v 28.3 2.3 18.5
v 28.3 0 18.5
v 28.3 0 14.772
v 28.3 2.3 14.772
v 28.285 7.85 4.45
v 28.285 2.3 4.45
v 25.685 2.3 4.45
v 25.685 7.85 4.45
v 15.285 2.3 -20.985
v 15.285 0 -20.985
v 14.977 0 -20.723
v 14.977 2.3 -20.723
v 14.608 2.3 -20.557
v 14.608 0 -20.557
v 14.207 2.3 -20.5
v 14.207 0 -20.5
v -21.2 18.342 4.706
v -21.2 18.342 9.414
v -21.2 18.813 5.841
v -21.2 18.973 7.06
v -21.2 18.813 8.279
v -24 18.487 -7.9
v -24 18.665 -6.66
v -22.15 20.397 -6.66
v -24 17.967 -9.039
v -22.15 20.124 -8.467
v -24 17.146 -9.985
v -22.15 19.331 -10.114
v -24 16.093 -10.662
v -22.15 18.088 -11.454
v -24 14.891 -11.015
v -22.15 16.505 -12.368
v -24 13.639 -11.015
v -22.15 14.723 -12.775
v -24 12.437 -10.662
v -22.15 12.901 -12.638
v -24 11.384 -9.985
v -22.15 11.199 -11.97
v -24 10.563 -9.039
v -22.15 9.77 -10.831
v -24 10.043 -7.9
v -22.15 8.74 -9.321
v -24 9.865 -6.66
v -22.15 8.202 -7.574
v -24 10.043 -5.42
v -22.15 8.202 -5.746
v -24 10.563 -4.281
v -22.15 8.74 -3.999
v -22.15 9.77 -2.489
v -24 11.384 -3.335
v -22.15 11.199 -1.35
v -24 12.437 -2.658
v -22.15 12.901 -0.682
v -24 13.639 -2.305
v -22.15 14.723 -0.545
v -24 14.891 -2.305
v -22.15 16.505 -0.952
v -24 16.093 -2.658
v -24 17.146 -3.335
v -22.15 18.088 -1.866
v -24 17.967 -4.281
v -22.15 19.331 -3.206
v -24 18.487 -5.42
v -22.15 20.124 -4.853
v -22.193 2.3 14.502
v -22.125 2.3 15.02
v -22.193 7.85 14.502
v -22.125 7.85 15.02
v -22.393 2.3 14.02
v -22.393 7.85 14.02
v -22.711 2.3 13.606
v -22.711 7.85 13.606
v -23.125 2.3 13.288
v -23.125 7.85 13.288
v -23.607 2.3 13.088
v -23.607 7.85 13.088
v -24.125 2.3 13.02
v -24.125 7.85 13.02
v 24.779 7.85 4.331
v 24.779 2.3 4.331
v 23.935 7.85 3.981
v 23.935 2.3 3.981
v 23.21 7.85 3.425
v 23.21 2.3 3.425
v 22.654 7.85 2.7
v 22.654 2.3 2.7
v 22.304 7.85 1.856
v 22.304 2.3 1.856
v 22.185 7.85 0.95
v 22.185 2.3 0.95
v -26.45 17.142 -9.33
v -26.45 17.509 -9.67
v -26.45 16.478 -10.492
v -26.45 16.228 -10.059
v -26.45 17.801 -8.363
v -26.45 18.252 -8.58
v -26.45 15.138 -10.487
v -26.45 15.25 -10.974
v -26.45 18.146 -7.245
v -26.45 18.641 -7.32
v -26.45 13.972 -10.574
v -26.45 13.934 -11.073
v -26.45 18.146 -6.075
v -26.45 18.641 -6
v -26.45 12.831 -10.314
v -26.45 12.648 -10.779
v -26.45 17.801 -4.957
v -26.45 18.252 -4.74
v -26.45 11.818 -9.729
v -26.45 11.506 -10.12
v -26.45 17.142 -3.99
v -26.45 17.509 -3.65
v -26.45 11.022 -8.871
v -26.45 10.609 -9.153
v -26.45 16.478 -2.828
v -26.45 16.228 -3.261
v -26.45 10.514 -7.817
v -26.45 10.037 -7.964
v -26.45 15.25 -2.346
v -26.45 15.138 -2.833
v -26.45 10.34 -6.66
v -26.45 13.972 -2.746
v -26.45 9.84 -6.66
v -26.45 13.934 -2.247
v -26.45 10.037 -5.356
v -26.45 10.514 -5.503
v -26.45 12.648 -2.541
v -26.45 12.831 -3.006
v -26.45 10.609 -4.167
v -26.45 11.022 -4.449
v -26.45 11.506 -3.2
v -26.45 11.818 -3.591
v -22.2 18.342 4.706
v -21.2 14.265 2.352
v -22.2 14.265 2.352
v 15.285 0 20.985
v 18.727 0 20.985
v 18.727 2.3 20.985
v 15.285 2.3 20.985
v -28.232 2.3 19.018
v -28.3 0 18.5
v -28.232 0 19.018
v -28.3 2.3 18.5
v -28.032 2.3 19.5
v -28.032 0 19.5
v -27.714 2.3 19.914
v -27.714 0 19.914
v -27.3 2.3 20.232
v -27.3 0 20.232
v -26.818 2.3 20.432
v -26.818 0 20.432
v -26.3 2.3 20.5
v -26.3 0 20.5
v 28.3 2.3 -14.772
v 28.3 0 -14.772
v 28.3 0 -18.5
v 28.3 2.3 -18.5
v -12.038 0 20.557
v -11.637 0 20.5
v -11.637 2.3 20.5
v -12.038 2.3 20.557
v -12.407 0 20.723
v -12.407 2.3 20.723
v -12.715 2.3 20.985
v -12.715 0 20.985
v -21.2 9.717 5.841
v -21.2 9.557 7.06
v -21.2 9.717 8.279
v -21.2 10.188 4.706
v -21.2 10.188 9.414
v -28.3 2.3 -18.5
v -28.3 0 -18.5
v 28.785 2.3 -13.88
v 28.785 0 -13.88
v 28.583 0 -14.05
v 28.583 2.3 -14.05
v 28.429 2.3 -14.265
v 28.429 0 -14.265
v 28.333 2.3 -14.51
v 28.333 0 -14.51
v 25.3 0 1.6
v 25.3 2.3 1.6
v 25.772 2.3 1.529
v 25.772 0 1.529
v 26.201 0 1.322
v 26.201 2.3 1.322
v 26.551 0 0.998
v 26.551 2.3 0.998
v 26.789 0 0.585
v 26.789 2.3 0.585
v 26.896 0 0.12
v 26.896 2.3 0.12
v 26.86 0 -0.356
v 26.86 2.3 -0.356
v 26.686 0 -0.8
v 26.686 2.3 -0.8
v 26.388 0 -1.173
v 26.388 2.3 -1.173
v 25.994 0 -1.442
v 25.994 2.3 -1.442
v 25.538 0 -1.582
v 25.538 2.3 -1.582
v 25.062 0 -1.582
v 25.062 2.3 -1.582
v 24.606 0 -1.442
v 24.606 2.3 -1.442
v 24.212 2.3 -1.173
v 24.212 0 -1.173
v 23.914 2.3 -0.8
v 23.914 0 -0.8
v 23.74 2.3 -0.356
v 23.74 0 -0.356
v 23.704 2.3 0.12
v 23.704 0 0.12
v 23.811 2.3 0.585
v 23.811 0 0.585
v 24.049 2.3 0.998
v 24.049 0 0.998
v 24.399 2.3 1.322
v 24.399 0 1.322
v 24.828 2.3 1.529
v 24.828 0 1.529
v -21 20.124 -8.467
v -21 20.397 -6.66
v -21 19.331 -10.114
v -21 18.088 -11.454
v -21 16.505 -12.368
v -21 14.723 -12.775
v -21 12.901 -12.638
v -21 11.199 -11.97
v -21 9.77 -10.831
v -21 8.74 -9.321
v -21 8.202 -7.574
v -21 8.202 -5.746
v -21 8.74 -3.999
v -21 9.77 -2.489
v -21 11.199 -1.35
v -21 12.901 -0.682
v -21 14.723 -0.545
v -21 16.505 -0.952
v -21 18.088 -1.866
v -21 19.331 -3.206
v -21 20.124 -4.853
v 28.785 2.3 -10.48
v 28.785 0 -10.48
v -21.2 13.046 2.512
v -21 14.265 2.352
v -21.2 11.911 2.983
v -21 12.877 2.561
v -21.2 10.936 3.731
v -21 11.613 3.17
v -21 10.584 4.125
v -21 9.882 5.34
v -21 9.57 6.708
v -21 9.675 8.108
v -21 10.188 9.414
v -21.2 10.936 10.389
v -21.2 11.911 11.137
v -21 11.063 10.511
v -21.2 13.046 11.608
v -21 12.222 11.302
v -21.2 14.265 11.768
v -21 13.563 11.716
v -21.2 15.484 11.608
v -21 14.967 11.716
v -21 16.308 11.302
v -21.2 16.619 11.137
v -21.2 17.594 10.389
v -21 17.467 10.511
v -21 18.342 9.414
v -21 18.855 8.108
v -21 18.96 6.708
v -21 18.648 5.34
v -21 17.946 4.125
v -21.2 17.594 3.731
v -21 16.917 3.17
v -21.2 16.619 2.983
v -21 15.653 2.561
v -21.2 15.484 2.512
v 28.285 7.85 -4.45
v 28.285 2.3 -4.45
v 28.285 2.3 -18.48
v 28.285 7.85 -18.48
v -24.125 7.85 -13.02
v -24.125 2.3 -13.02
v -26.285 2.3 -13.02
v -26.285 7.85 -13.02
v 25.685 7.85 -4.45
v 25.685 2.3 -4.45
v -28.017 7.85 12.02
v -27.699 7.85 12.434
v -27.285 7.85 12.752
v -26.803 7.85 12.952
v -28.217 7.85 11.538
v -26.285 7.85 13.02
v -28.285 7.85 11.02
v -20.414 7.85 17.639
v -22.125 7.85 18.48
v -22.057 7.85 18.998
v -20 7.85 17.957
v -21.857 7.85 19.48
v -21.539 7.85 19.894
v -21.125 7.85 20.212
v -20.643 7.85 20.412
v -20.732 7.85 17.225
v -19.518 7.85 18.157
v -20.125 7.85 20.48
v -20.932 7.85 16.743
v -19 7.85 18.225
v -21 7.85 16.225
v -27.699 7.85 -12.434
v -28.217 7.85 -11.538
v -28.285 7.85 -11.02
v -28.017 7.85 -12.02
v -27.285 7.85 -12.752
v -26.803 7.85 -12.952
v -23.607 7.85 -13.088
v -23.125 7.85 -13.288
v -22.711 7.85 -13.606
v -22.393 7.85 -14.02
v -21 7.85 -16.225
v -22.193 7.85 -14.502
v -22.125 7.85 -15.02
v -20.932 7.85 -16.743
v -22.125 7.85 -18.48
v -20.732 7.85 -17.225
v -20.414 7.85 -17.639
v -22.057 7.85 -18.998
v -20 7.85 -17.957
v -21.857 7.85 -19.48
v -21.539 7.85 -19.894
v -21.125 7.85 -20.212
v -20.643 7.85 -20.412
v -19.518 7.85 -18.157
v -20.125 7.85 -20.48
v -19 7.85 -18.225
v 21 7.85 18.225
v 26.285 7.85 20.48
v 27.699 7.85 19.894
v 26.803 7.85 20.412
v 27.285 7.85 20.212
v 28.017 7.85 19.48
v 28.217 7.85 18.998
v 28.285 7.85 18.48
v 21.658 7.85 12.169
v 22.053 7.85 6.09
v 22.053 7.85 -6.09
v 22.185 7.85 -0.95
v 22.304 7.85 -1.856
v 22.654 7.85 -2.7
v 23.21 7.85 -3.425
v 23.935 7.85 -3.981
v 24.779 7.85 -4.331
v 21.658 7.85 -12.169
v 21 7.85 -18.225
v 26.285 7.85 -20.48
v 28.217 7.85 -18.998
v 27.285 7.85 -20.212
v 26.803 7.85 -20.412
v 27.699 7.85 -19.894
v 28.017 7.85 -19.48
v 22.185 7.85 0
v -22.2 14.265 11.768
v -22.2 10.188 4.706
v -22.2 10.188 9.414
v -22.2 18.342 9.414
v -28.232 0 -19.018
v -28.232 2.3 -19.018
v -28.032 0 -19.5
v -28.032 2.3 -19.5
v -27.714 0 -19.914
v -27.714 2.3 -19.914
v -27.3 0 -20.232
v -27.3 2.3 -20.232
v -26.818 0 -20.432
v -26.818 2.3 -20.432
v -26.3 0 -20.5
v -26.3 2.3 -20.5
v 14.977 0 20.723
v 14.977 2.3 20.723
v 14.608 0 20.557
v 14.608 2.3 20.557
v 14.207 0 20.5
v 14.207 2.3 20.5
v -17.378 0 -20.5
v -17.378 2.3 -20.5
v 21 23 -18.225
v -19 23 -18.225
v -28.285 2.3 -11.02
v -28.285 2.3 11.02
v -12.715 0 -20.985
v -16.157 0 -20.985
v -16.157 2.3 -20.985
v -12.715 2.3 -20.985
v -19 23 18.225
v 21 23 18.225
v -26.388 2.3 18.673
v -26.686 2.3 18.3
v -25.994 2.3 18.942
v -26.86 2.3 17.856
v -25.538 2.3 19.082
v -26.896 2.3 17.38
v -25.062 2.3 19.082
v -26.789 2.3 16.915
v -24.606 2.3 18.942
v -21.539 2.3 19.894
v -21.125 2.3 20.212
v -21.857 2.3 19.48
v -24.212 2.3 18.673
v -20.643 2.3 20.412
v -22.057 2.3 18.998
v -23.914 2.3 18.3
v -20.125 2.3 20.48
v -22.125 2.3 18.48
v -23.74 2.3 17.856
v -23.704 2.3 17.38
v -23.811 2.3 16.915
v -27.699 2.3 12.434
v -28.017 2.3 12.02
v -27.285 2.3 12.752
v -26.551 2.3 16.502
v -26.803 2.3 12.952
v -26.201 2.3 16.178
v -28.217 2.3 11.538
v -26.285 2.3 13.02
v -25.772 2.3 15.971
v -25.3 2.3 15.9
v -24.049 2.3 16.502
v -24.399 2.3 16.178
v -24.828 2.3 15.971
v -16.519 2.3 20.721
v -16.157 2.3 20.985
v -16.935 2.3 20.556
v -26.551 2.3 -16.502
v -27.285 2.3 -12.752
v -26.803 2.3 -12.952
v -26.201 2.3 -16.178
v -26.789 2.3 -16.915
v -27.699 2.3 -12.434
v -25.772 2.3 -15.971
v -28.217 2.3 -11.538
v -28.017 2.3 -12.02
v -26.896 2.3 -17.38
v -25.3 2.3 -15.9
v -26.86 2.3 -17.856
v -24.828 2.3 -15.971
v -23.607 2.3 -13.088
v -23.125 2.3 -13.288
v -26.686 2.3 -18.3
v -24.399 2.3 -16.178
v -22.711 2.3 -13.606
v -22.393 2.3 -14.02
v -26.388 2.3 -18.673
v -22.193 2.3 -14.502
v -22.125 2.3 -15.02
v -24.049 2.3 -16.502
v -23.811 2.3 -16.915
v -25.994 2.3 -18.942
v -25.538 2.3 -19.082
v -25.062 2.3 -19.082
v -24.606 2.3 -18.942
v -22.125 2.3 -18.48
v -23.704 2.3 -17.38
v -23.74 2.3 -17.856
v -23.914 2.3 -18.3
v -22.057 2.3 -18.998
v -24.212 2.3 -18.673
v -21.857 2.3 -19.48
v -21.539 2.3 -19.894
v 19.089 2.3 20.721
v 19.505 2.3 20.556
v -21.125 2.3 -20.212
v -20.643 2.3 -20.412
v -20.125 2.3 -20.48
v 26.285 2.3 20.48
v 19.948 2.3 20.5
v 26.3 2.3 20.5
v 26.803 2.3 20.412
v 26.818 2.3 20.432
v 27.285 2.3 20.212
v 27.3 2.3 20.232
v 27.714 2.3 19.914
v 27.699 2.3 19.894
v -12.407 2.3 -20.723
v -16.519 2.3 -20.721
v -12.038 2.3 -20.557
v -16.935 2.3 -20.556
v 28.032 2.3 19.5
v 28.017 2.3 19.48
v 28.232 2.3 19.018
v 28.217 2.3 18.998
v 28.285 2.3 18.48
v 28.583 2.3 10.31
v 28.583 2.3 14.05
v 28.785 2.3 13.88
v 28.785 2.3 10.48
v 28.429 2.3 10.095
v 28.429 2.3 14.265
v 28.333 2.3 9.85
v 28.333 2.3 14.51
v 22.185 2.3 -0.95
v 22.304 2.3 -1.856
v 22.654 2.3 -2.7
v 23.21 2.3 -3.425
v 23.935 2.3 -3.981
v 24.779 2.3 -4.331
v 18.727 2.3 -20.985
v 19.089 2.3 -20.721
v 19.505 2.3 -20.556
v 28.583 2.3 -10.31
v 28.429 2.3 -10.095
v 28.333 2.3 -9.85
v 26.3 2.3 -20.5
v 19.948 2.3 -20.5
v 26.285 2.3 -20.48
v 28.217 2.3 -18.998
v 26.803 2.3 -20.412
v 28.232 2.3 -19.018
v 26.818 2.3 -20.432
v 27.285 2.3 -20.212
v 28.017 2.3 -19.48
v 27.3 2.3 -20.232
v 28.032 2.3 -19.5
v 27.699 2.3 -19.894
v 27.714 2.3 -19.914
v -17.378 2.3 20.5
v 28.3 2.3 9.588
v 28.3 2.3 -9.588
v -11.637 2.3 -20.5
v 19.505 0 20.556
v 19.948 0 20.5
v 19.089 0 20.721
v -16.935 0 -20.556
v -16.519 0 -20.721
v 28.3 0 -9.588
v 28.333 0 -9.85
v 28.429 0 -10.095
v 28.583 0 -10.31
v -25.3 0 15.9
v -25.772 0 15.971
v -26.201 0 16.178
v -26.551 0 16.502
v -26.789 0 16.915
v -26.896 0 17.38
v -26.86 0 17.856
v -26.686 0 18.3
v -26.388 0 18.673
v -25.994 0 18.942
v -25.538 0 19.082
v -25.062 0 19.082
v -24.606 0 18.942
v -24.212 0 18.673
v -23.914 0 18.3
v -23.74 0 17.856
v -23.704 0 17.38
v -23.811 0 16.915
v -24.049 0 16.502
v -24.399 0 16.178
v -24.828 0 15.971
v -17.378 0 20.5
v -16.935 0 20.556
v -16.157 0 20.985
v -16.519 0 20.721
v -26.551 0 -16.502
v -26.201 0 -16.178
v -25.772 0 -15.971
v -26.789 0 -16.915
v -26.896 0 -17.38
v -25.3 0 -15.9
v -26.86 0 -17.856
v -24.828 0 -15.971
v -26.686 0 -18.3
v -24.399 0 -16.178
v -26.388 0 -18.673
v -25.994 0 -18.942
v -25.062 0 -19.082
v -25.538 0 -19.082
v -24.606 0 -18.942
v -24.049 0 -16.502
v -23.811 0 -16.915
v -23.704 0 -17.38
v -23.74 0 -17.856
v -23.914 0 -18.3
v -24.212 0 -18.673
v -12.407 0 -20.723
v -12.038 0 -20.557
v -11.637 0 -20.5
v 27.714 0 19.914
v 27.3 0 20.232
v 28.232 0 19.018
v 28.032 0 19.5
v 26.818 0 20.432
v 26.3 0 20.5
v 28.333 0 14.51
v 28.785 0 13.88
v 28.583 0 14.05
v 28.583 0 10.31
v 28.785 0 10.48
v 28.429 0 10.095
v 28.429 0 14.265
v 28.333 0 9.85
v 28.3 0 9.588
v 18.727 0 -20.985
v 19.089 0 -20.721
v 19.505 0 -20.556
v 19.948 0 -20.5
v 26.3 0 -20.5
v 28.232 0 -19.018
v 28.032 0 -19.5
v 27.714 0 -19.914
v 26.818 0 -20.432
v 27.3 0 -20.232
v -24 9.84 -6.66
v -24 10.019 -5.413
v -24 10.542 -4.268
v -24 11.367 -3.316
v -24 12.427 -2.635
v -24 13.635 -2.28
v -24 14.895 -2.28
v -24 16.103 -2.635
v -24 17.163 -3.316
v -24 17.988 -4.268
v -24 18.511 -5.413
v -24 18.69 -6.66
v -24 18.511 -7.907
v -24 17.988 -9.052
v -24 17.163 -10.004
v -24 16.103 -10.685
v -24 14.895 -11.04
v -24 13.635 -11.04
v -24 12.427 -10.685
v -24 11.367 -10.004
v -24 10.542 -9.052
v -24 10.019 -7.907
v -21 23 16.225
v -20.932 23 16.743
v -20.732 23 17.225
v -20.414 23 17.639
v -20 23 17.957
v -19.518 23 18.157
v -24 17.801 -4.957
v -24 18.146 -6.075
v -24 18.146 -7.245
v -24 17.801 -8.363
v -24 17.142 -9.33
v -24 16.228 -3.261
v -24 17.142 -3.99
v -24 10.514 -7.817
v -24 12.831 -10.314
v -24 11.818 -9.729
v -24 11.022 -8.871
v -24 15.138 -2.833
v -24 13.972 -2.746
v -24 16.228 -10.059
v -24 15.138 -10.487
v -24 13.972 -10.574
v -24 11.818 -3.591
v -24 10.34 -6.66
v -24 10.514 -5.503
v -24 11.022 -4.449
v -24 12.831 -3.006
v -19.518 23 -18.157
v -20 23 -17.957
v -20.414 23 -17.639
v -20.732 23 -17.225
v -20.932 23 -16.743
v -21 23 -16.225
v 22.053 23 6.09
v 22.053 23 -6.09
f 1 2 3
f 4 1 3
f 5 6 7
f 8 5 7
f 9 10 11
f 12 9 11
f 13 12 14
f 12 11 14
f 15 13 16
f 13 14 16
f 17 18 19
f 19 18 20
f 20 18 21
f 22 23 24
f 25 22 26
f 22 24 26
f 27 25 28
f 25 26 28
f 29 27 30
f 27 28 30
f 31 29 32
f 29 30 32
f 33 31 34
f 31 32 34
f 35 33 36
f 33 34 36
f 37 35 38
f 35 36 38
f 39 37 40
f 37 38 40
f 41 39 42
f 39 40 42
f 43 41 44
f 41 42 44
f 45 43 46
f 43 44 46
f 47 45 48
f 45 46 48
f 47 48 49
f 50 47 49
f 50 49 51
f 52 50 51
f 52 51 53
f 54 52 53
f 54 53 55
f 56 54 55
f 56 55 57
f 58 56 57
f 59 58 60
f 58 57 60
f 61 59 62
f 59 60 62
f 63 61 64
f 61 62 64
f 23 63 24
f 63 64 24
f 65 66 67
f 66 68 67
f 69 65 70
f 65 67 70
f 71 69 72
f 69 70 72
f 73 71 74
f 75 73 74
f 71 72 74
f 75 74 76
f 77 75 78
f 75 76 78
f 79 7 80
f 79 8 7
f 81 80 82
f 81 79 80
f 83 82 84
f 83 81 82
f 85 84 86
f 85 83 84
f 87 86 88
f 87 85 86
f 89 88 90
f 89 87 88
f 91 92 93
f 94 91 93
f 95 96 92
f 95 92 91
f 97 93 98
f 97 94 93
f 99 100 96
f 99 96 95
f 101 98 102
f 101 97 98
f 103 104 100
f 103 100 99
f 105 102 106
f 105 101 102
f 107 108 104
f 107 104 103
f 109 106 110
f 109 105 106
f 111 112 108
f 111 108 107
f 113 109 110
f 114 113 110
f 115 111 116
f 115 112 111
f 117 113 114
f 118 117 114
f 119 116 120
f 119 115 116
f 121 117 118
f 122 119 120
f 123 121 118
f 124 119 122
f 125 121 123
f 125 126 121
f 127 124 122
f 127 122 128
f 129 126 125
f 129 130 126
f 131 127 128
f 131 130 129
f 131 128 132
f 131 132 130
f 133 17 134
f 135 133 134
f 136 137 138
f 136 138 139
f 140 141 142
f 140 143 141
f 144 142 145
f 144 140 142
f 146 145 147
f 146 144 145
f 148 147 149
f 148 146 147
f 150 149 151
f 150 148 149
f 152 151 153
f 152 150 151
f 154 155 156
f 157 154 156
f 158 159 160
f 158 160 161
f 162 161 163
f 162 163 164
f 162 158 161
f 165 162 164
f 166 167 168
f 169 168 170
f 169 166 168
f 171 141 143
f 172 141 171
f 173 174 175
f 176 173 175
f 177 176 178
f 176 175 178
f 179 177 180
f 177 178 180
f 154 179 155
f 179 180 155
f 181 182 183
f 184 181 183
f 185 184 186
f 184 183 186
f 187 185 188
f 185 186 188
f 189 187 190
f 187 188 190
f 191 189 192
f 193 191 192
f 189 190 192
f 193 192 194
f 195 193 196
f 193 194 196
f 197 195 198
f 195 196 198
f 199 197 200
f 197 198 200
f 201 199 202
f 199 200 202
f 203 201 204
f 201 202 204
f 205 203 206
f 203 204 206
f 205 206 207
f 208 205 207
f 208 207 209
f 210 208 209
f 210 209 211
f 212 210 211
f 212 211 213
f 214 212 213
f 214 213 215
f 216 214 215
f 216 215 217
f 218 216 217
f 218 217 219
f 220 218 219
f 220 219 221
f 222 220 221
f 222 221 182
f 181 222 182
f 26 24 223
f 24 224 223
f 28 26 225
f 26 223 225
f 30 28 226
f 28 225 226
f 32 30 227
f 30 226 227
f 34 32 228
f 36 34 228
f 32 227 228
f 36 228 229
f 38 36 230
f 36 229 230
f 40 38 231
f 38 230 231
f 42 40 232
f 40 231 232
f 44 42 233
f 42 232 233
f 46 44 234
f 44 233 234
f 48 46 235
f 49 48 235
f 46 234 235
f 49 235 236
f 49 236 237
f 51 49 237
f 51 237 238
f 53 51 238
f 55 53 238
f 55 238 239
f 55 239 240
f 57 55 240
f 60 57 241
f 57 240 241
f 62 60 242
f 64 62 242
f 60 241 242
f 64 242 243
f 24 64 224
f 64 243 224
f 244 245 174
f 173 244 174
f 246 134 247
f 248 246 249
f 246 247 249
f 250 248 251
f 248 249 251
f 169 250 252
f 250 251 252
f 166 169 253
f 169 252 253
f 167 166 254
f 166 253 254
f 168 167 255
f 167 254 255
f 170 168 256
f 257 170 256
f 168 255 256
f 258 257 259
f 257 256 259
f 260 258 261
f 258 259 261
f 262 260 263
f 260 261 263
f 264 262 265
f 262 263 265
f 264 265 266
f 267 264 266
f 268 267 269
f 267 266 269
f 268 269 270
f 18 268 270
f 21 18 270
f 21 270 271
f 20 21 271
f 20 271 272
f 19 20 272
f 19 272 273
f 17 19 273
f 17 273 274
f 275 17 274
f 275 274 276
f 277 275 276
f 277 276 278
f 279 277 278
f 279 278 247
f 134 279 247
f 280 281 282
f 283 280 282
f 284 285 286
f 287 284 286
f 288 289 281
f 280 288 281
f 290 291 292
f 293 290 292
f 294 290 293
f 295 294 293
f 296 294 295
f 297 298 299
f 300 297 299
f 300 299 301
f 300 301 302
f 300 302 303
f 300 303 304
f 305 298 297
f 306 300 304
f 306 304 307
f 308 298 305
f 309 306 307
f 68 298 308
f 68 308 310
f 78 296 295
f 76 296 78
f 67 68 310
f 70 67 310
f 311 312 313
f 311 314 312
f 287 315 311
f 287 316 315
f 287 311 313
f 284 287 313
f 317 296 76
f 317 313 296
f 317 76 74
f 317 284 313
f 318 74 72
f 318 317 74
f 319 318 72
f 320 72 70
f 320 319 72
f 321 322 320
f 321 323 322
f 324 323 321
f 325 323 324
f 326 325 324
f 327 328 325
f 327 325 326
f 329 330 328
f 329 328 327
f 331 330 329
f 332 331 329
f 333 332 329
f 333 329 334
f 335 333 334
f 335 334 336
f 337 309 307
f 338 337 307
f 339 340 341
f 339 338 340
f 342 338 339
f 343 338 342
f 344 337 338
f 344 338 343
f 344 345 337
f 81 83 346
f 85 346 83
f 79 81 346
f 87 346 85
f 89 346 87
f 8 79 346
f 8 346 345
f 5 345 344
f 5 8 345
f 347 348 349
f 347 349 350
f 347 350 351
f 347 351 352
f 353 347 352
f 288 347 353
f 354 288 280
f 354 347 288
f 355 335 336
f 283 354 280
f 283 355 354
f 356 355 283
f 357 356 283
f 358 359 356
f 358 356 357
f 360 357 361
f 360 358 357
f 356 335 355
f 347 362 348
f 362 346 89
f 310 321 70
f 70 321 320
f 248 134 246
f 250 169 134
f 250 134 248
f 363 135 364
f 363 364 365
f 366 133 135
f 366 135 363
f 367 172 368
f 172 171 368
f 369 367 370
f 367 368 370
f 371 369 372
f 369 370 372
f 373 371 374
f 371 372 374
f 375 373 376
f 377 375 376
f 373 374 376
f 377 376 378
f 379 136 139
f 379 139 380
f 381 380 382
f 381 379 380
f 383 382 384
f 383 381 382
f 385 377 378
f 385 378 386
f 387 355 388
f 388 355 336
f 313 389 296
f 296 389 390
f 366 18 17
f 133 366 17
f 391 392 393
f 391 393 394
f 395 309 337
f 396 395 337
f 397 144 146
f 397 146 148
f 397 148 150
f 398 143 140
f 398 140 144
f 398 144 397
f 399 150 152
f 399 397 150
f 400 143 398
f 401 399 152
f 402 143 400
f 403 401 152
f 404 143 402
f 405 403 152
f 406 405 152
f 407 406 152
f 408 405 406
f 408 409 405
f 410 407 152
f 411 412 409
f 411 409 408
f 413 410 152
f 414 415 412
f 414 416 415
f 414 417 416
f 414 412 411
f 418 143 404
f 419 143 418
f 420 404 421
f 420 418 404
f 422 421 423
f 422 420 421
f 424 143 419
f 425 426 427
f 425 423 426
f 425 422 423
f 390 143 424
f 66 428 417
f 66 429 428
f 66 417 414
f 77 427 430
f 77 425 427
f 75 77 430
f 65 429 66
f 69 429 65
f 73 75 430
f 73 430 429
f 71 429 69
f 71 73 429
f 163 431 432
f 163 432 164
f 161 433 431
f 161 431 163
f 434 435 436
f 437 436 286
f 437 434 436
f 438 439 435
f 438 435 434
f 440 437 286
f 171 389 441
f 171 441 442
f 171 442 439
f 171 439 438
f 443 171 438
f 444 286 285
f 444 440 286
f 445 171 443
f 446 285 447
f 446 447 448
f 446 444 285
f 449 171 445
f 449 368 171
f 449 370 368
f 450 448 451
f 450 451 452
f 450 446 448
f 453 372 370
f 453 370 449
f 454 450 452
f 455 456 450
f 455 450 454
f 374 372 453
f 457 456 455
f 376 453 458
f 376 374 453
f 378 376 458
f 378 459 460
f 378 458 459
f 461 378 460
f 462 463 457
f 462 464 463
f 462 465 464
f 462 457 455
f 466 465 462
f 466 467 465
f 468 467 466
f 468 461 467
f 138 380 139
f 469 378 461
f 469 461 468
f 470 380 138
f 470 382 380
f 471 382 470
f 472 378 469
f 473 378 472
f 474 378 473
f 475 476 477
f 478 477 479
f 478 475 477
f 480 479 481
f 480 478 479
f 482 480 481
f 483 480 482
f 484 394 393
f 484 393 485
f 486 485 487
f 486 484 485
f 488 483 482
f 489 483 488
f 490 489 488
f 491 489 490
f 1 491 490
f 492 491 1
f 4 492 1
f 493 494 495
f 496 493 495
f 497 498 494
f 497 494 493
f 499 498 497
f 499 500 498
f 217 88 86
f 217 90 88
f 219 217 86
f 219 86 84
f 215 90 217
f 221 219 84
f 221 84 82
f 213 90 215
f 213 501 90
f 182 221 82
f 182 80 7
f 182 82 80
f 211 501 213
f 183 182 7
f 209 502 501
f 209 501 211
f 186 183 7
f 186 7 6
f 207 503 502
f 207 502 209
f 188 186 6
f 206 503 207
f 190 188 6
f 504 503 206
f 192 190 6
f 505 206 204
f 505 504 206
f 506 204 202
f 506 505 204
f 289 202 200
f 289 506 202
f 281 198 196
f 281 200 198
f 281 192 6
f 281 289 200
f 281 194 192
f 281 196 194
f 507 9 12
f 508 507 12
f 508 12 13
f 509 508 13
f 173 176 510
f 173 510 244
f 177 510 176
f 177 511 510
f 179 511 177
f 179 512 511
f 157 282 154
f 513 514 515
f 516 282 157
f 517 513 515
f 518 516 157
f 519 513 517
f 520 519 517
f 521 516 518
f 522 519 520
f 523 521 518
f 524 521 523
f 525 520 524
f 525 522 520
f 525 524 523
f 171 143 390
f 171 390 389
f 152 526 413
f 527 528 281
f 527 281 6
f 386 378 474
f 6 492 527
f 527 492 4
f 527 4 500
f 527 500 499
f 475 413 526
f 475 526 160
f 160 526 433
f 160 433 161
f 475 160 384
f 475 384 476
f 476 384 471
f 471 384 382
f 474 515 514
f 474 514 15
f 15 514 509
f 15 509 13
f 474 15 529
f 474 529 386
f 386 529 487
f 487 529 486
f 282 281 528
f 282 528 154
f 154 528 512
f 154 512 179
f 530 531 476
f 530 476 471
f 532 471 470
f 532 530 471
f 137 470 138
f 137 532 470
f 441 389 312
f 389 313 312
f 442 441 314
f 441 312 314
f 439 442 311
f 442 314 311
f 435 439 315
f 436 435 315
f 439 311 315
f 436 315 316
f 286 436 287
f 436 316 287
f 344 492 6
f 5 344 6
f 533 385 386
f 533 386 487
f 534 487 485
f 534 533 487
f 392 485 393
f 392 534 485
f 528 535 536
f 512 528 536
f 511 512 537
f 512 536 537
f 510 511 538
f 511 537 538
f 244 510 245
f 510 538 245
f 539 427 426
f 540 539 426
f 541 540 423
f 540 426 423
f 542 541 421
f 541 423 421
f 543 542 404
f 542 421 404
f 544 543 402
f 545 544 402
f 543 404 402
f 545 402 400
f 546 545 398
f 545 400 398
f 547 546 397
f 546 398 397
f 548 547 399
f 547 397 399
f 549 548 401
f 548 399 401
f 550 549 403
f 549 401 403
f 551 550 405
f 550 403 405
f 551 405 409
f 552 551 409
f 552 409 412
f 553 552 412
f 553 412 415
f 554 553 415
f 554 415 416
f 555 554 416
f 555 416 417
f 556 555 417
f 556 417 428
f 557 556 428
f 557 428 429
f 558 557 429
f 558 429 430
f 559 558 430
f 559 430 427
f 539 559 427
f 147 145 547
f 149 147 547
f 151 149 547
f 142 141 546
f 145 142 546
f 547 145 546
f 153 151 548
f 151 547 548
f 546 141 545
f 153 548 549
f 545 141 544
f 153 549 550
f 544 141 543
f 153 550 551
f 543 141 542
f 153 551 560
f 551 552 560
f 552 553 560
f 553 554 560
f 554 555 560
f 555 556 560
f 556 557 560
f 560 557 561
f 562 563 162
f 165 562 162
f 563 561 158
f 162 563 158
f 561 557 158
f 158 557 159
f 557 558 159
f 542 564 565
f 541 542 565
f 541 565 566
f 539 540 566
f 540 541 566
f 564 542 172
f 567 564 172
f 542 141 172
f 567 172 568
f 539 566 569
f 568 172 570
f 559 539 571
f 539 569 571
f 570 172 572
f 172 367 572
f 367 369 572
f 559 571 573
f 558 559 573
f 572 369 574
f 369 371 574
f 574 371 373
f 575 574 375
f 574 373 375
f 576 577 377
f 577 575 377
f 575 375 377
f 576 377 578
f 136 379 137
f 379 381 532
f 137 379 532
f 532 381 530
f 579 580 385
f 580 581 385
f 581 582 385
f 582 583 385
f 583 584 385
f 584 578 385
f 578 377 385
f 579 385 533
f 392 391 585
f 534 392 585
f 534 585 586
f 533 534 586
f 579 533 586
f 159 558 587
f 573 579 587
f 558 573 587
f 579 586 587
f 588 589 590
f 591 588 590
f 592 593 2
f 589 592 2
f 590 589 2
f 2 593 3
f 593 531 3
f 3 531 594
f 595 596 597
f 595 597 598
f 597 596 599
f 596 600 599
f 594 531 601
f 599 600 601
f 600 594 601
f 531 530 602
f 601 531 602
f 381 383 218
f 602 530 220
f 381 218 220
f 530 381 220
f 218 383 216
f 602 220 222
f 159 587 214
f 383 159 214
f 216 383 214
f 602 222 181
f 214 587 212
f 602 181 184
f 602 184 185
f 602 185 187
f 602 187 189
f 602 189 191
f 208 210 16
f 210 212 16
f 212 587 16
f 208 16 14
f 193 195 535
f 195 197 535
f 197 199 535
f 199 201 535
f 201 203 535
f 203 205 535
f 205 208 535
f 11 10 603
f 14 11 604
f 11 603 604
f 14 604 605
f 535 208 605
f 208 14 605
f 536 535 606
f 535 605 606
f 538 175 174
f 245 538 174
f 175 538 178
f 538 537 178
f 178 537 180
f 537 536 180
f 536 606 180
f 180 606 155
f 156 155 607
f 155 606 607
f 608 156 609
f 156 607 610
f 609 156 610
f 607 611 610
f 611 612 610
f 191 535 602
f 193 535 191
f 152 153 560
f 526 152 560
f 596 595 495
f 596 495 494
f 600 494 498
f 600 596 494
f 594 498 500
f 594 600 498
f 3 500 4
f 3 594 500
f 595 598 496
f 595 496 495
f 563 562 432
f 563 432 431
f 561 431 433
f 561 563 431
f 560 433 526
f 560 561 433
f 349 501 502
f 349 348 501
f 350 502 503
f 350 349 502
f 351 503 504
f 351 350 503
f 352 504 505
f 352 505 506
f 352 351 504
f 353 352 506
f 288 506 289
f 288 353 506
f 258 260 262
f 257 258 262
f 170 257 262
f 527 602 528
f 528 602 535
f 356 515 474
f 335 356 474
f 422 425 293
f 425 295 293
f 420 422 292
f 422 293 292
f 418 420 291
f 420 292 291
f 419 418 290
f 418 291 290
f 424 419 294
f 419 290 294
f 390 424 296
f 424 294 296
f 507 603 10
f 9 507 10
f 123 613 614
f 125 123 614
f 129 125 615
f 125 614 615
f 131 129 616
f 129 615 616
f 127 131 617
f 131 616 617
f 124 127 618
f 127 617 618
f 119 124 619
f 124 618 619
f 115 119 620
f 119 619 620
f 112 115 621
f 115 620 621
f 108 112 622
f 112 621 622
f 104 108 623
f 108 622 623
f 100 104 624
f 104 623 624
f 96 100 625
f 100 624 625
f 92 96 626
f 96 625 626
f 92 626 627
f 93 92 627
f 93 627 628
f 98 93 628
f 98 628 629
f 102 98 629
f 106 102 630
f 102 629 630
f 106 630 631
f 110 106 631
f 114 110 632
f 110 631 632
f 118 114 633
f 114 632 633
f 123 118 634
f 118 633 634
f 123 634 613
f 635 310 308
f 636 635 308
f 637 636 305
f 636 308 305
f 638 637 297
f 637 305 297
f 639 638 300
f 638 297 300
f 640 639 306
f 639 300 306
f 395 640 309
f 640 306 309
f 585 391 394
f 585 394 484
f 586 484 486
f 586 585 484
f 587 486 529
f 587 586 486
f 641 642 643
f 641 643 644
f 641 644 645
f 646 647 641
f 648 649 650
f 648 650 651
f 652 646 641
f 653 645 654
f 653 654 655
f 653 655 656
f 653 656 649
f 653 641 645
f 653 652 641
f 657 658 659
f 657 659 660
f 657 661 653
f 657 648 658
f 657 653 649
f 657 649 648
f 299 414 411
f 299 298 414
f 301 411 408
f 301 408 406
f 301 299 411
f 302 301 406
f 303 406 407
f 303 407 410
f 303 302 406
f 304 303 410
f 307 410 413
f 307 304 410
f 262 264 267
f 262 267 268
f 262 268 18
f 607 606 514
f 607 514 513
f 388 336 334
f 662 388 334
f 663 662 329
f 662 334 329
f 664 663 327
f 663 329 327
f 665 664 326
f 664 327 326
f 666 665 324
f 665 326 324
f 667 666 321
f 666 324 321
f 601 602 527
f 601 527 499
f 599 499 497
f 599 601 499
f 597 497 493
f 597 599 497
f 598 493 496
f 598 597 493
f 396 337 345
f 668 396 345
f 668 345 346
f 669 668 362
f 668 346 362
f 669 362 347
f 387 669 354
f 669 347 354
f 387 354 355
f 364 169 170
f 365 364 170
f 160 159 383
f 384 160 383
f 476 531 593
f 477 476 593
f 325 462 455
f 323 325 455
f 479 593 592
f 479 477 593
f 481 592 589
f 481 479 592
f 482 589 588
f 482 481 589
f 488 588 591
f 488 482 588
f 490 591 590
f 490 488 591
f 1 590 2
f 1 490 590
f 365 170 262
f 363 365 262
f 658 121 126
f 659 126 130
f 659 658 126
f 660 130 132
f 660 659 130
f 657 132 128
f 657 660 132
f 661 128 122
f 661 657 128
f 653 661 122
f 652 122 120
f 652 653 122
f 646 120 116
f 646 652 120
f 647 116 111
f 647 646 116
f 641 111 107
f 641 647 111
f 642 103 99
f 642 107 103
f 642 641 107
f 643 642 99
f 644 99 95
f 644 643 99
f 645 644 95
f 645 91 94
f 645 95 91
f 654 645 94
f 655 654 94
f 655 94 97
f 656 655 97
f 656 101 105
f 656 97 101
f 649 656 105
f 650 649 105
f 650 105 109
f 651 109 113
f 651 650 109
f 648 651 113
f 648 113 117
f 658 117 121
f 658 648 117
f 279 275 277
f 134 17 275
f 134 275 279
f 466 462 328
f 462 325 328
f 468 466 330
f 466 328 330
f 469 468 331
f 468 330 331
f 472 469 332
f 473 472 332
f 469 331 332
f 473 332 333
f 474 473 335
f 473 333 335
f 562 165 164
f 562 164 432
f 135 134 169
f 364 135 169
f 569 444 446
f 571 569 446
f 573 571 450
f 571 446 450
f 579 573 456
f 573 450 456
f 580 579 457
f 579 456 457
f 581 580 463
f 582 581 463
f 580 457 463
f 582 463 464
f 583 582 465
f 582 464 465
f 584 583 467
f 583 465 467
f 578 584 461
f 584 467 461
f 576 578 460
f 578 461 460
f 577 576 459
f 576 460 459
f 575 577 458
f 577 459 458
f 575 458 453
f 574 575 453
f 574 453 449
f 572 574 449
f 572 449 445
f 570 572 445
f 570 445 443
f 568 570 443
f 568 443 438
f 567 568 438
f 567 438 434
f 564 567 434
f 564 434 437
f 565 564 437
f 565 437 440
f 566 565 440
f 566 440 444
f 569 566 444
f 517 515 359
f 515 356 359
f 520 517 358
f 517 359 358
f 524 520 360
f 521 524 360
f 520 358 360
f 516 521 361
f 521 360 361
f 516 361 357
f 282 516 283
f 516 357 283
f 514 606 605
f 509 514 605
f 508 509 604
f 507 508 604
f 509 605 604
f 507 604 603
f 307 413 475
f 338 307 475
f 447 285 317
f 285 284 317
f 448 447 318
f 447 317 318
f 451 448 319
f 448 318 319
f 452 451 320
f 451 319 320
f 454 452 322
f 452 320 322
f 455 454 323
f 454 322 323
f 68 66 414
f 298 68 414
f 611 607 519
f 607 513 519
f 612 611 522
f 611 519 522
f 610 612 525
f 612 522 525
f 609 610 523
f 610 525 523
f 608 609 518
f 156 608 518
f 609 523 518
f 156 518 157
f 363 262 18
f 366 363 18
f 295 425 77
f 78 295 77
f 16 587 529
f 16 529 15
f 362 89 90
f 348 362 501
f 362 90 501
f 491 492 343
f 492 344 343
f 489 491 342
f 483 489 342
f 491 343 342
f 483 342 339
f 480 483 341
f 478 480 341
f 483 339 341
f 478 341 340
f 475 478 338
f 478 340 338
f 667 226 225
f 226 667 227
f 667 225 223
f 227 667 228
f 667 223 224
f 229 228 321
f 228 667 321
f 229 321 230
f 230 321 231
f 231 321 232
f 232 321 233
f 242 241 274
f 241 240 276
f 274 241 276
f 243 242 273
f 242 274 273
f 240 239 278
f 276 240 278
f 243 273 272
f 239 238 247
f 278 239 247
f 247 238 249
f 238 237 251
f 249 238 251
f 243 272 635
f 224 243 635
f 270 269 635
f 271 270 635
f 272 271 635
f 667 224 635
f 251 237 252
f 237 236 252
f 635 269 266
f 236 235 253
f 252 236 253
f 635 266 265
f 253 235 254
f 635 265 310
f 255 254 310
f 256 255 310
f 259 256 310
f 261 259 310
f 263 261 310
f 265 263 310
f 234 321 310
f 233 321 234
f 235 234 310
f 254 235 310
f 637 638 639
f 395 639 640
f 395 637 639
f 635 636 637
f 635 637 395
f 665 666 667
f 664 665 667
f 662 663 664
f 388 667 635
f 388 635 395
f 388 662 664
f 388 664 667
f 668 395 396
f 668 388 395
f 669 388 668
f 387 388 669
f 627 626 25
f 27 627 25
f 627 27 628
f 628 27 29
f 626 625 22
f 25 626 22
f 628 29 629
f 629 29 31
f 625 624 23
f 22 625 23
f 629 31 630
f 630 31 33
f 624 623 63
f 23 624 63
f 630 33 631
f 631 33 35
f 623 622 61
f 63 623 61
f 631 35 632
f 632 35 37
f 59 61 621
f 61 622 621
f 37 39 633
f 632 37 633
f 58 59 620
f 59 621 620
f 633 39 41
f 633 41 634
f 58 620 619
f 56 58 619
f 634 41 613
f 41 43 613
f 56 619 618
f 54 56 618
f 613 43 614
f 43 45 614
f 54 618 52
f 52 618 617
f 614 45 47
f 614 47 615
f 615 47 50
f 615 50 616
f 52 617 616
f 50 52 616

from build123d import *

# Parameters (mm, degrees)
SKETCH1_W               = 56.6
SKETCH1_H               = 41
BOSS_EXTRUDE1_DEPTH     = 2.3
BOSS_EXTRUDE2_DEPTH     = 5.55
BOSS_EXTRUDE3_DEPTH     = 15.15
FILLET1_R               = 2
BOSS_EXTRUDE5_DEPTH     = 2.3
BOSS_EXTRUDE6_DEPTH     = 2.3
SKETCH6_R               = 1.6
CUT_EXTRUDE1_DEPTH      = 42.199956917
FILLET2_R               = 3.5
SKETCH7_R               = 4.708157521
BOSS_EXTRUDE7_DEPTH     = 0.2
SKETCH11_R              = 4.425
BOSS_EXTRUDE8_DEPTH     = 2.45
CUT_EXTRUDE2_DEPTH      = 10
CUT_EXTRUDE2_DEPTH_BACK = 2.45
SKETCH12_R              = 3.925
BOSS_EXTRUDE10_DEPTH    = 1


with BuildPart() as part:
    # Sketch1 → Boss-Extrude1 (new body)
    with BuildSketch(Plane(origin=(0, 0, 0), x_dir=(1, 0, 0), z_dir=(0, 1, 0))):
        Rectangle(SKETCH1_W, SKETCH1_H)
    extrude(amount=BOSS_EXTRUDE1_DEPTH)

    # Sketch2 → Boss-Extrude2 (add)
    with BuildSketch(Plane(origin=(0, 2.3, 0), x_dir=(1, 0, 0), z_dir=(0, 1, 0))):
        Polygon((-22.125, -20.48), (28.285, -20.48), (28.285, -4.45), (22.185, -4.45), (22.185, 4.45), (28.285, 4.45), (28.285, 20.48), (-22.125, 20.48), (-22.125, 13.02), (-28.285, 13.02), (-28.285, -13.02), (-22.125, -13.02), align=None)
    extrude(amount=BOSS_EXTRUDE2_DEPTH)

    # Sketch3 → Boss-Extrude3 (add)
    with BuildSketch(Plane(origin=(0, 7.85, 0), x_dir=(1, 0, 0), z_dir=(0, 1, 0))):
        with BuildLine():
            Line((-19, -18.225), (21, -18.225))
            ThreePointArc((21, -18.225), (22.185, 0), (21, 18.225))
            Line((21, 18.225), (-19, 18.225))
            ThreePointArc((-19, 18.225), (-20.414213562, 17.639213562), (-21, 16.225))
            Line((-21, 16.225), (-21, -16.225))
            ThreePointArc((-21, -16.225), (-20.414213562, -17.639213562), (-19, -18.225))
        make_face()
    extrude(amount=BOSS_EXTRUDE3_DEPTH)

    # Fillet1
    fillet1_edges = [part.edges().sort_by_distance(p)[0] for p in [
        (28.285, 5.075, -20.48),
        (-22.125, 5.075, -20.48),
        (-22.125, 5.075, -13.02),
        (-28.285, 5.075, -13.02),
        (-28.285, 5.075, 13.02),
        (-22.125, 5.075, 13.02),
        (-22.125, 5.075, 20.48),
        (28.285, 5.075, 20.48),
        (28.3, 1.15, 20.5),
        (-28.3, 1.15, 20.5),
        (-28.3, 1.15, -20.5),
        (28.3, 1.15, -20.5),
    ]]
    fillet(fillet1_edges, radius=FILLET1_R)

    # Sketch4 → Boss-Extrude5 (add)
    with BuildSketch(Plane(origin=(0, 0, 0), x_dir=(1, 0, 0), z_dir=(0, 1, 0))):
        with BuildLine():
            Line((28.3, 14.772353725), (28.3, 9.587646275))
            ThreePointArc((28.3, 9.587646275), (28.429084519, 10.095465182), (28.785, 10.48))
            Line((28.785, 10.48), (28.785, 13.88))
            ThreePointArc((28.785, 13.88), (28.429084519, 14.264534818), (28.3, 14.772353725))
        make_face()
        with BuildLine():
            ThreePointArc((28.3, -9.587646275), (28.429084519, -10.095465182), (28.785, -10.48))
            Line((28.785, -10.48), (28.785, -13.88))
            ThreePointArc((28.785, -13.88), (28.429084519, -14.264534818), (28.3, -14.772353725))
            Line((28.3, -14.772353725), (28.3, -9.587646275))
        make_face()
    extrude(amount=BOSS_EXTRUDE5_DEPTH)

    # Sketch5 → Boss-Extrude6 (add)
    with BuildSketch(Plane(origin=(29.434734965, 0, -17.005006325), x_dir=(0, 0, -1), z_dir=(0, 1, 0))):
        with BuildLine():
            Line((3.494993675, 9.629302498), (3.494993675, 9.486266265))
            ThreePointArc((3.494993675, 9.486266265), (3.620682756, 10.143155137), (3.979993675, 10.707244136))
            Line((3.979993675, 10.707244136), (3.979993675, 14.149734965))
            ThreePointArc((3.979993675, 14.149734965), (3.621827878, 14.636664087), (3.494993675, 15.227676603))
            Line((3.494993675, 15.227676603), (3.494993675, 9.629302498))
        make_face()
        with BuildLine():
            Line((-37.505006325, 46.813203664), (-37.505006325, 46.670167432))
            Line((-37.505006325, 46.670167432), (-37.505006325, 41.071793326))
            ThreePointArc((-37.505006325, 41.071793326), (-37.631840527, 41.662805842), (-37.990006325, 42.149734965))
            Line((-37.990006325, 42.149734965), (-37.990006325, 45.592225793))
            ThreePointArc((-37.990006325, 45.592225793), (-37.630695406, 46.156314792), (-37.505006325, 46.813203664))
        make_face()
        with BuildLine():
            Line((3.494993675, 41.071793326), (3.494993675, 46.670167432))
            Line((3.494993675, 46.670167432), (3.494993675, 46.813203664))
            ThreePointArc((3.494993675, 46.813203664), (3.620682756, 46.156314792), (3.979993675, 45.592225793))
            Line((3.979993675, 45.592225793), (3.979993675, 42.149734965))
            ThreePointArc((3.979993675, 42.149734965), (3.621827878, 41.662805842), (3.494993675, 41.071793326))
        make_face()
        with BuildLine():
            Line((-37.505006325, 15.227676603), (-37.505006325, 9.629302498))
            Line((-37.505006325, 9.629302498), (-37.505006325, 9.486266265))
            ThreePointArc((-37.505006325, 9.486266265), (-37.630695406, 10.143155137), (-37.990006325, 10.707244136))
            Line((-37.990006325, 10.707244136), (-37.990006325, 14.149734965))
            ThreePointArc((-37.990006325, 14.149734965), (-37.631840527, 14.636664087), (-37.505006325, 15.227676603))
        make_face()
    extrude(amount=BOSS_EXTRUDE6_DEPTH)

    # Sketch6 → Cut-Extrude1 (cut, through all)
    with BuildSketch(Plane(origin=(0, 2.3, 0), x_dir=(1, 0, 0), z_dir=(0, 1, 0))):
        with Locations(Location((-25.3, 17.5, 0), (0, 0, 270))):
            Circle(SKETCH6_R)
        with Locations(Location((-25.3, -17.5, 0), (0, 0, 90))):
            Circle(SKETCH6_R)
        with Locations(Location((25.3, 0, 0), (0, 0, 270))):
            Circle(SKETCH6_R)
    extrude(amount=-CUT_EXTRUDE1_DEPTH, mode=Mode.SUBTRACT)

    # Fillet2
    fillet2_edges = [part.edges().sort_by_distance(p)[0] for p in [
        (22.185, 5.075, 4.45),
        (22.185, 5.075, -4.45),
    ]]
    fillet(fillet2_edges, radius=FILLET2_R)

    # Sketch7 → Boss-Extrude7 (add)
    with BuildSketch(Plane.ZY.offset(21)):
        with Locations(Location((7.06, 14.265, 0), (0, 0, 180))):
            Circle(SKETCH7_R)
    extrude(amount=BOSS_EXTRUDE7_DEPTH)

    # Sketch9 → Revolve1 (revolve)
    with BuildSketch(Plane(origin=(0, 0, -6.66), x_dir=(-1, 0, 0), z_dir=(0, 0, -1))):
        Polygon((21, 20.396842479), (21, 14.265), (24, 14.265), (24, 18.665), (22.15, 20.396842479), align=None)
    revolve(axis=Axis((-21, 14.265, -6.66), (-1, 0, 0)))

    # Sketch11 → Boss-Extrude8 (add)
    with BuildSketch(Plane.ZY.offset(24)):
        with Locations(Location((-6.66, 14.265, 0), (0, 0, 270))):
            Circle(SKETCH11_R)
    extrude(amount=BOSS_EXTRUDE8_DEPTH)

    # Sketch12 → Cut-Extrude2 (cut, two sides: drawn at the far end of the back side and taken through both)
    with BuildSketch(Plane.ZY.offset(26.45).offset(-CUT_EXTRUDE2_DEPTH_BACK)):
        with Locations(Location((-6.66, 14.265, 0), (0, 0, 270))):
            Circle(SKETCH12_R)
    extrude(amount=CUT_EXTRUDE2_DEPTH + CUT_EXTRUDE2_DEPTH_BACK, mode=Mode.SUBTRACT)

    # Sketch13 → Boss-Extrude10 (add)
    with BuildSketch(Plane.ZY.offset(21.2)):
        Polygon((2.351842479, 14.265), (4.705921239, 10.187615982), (9.414078761, 10.187615982), (11.768157521, 14.265), (9.414078761, 18.342384018), (4.705921239, 18.342384018), align=None)
    extrude(amount=BOSS_EXTRUDE10_DEPTH)


solid = part.part
